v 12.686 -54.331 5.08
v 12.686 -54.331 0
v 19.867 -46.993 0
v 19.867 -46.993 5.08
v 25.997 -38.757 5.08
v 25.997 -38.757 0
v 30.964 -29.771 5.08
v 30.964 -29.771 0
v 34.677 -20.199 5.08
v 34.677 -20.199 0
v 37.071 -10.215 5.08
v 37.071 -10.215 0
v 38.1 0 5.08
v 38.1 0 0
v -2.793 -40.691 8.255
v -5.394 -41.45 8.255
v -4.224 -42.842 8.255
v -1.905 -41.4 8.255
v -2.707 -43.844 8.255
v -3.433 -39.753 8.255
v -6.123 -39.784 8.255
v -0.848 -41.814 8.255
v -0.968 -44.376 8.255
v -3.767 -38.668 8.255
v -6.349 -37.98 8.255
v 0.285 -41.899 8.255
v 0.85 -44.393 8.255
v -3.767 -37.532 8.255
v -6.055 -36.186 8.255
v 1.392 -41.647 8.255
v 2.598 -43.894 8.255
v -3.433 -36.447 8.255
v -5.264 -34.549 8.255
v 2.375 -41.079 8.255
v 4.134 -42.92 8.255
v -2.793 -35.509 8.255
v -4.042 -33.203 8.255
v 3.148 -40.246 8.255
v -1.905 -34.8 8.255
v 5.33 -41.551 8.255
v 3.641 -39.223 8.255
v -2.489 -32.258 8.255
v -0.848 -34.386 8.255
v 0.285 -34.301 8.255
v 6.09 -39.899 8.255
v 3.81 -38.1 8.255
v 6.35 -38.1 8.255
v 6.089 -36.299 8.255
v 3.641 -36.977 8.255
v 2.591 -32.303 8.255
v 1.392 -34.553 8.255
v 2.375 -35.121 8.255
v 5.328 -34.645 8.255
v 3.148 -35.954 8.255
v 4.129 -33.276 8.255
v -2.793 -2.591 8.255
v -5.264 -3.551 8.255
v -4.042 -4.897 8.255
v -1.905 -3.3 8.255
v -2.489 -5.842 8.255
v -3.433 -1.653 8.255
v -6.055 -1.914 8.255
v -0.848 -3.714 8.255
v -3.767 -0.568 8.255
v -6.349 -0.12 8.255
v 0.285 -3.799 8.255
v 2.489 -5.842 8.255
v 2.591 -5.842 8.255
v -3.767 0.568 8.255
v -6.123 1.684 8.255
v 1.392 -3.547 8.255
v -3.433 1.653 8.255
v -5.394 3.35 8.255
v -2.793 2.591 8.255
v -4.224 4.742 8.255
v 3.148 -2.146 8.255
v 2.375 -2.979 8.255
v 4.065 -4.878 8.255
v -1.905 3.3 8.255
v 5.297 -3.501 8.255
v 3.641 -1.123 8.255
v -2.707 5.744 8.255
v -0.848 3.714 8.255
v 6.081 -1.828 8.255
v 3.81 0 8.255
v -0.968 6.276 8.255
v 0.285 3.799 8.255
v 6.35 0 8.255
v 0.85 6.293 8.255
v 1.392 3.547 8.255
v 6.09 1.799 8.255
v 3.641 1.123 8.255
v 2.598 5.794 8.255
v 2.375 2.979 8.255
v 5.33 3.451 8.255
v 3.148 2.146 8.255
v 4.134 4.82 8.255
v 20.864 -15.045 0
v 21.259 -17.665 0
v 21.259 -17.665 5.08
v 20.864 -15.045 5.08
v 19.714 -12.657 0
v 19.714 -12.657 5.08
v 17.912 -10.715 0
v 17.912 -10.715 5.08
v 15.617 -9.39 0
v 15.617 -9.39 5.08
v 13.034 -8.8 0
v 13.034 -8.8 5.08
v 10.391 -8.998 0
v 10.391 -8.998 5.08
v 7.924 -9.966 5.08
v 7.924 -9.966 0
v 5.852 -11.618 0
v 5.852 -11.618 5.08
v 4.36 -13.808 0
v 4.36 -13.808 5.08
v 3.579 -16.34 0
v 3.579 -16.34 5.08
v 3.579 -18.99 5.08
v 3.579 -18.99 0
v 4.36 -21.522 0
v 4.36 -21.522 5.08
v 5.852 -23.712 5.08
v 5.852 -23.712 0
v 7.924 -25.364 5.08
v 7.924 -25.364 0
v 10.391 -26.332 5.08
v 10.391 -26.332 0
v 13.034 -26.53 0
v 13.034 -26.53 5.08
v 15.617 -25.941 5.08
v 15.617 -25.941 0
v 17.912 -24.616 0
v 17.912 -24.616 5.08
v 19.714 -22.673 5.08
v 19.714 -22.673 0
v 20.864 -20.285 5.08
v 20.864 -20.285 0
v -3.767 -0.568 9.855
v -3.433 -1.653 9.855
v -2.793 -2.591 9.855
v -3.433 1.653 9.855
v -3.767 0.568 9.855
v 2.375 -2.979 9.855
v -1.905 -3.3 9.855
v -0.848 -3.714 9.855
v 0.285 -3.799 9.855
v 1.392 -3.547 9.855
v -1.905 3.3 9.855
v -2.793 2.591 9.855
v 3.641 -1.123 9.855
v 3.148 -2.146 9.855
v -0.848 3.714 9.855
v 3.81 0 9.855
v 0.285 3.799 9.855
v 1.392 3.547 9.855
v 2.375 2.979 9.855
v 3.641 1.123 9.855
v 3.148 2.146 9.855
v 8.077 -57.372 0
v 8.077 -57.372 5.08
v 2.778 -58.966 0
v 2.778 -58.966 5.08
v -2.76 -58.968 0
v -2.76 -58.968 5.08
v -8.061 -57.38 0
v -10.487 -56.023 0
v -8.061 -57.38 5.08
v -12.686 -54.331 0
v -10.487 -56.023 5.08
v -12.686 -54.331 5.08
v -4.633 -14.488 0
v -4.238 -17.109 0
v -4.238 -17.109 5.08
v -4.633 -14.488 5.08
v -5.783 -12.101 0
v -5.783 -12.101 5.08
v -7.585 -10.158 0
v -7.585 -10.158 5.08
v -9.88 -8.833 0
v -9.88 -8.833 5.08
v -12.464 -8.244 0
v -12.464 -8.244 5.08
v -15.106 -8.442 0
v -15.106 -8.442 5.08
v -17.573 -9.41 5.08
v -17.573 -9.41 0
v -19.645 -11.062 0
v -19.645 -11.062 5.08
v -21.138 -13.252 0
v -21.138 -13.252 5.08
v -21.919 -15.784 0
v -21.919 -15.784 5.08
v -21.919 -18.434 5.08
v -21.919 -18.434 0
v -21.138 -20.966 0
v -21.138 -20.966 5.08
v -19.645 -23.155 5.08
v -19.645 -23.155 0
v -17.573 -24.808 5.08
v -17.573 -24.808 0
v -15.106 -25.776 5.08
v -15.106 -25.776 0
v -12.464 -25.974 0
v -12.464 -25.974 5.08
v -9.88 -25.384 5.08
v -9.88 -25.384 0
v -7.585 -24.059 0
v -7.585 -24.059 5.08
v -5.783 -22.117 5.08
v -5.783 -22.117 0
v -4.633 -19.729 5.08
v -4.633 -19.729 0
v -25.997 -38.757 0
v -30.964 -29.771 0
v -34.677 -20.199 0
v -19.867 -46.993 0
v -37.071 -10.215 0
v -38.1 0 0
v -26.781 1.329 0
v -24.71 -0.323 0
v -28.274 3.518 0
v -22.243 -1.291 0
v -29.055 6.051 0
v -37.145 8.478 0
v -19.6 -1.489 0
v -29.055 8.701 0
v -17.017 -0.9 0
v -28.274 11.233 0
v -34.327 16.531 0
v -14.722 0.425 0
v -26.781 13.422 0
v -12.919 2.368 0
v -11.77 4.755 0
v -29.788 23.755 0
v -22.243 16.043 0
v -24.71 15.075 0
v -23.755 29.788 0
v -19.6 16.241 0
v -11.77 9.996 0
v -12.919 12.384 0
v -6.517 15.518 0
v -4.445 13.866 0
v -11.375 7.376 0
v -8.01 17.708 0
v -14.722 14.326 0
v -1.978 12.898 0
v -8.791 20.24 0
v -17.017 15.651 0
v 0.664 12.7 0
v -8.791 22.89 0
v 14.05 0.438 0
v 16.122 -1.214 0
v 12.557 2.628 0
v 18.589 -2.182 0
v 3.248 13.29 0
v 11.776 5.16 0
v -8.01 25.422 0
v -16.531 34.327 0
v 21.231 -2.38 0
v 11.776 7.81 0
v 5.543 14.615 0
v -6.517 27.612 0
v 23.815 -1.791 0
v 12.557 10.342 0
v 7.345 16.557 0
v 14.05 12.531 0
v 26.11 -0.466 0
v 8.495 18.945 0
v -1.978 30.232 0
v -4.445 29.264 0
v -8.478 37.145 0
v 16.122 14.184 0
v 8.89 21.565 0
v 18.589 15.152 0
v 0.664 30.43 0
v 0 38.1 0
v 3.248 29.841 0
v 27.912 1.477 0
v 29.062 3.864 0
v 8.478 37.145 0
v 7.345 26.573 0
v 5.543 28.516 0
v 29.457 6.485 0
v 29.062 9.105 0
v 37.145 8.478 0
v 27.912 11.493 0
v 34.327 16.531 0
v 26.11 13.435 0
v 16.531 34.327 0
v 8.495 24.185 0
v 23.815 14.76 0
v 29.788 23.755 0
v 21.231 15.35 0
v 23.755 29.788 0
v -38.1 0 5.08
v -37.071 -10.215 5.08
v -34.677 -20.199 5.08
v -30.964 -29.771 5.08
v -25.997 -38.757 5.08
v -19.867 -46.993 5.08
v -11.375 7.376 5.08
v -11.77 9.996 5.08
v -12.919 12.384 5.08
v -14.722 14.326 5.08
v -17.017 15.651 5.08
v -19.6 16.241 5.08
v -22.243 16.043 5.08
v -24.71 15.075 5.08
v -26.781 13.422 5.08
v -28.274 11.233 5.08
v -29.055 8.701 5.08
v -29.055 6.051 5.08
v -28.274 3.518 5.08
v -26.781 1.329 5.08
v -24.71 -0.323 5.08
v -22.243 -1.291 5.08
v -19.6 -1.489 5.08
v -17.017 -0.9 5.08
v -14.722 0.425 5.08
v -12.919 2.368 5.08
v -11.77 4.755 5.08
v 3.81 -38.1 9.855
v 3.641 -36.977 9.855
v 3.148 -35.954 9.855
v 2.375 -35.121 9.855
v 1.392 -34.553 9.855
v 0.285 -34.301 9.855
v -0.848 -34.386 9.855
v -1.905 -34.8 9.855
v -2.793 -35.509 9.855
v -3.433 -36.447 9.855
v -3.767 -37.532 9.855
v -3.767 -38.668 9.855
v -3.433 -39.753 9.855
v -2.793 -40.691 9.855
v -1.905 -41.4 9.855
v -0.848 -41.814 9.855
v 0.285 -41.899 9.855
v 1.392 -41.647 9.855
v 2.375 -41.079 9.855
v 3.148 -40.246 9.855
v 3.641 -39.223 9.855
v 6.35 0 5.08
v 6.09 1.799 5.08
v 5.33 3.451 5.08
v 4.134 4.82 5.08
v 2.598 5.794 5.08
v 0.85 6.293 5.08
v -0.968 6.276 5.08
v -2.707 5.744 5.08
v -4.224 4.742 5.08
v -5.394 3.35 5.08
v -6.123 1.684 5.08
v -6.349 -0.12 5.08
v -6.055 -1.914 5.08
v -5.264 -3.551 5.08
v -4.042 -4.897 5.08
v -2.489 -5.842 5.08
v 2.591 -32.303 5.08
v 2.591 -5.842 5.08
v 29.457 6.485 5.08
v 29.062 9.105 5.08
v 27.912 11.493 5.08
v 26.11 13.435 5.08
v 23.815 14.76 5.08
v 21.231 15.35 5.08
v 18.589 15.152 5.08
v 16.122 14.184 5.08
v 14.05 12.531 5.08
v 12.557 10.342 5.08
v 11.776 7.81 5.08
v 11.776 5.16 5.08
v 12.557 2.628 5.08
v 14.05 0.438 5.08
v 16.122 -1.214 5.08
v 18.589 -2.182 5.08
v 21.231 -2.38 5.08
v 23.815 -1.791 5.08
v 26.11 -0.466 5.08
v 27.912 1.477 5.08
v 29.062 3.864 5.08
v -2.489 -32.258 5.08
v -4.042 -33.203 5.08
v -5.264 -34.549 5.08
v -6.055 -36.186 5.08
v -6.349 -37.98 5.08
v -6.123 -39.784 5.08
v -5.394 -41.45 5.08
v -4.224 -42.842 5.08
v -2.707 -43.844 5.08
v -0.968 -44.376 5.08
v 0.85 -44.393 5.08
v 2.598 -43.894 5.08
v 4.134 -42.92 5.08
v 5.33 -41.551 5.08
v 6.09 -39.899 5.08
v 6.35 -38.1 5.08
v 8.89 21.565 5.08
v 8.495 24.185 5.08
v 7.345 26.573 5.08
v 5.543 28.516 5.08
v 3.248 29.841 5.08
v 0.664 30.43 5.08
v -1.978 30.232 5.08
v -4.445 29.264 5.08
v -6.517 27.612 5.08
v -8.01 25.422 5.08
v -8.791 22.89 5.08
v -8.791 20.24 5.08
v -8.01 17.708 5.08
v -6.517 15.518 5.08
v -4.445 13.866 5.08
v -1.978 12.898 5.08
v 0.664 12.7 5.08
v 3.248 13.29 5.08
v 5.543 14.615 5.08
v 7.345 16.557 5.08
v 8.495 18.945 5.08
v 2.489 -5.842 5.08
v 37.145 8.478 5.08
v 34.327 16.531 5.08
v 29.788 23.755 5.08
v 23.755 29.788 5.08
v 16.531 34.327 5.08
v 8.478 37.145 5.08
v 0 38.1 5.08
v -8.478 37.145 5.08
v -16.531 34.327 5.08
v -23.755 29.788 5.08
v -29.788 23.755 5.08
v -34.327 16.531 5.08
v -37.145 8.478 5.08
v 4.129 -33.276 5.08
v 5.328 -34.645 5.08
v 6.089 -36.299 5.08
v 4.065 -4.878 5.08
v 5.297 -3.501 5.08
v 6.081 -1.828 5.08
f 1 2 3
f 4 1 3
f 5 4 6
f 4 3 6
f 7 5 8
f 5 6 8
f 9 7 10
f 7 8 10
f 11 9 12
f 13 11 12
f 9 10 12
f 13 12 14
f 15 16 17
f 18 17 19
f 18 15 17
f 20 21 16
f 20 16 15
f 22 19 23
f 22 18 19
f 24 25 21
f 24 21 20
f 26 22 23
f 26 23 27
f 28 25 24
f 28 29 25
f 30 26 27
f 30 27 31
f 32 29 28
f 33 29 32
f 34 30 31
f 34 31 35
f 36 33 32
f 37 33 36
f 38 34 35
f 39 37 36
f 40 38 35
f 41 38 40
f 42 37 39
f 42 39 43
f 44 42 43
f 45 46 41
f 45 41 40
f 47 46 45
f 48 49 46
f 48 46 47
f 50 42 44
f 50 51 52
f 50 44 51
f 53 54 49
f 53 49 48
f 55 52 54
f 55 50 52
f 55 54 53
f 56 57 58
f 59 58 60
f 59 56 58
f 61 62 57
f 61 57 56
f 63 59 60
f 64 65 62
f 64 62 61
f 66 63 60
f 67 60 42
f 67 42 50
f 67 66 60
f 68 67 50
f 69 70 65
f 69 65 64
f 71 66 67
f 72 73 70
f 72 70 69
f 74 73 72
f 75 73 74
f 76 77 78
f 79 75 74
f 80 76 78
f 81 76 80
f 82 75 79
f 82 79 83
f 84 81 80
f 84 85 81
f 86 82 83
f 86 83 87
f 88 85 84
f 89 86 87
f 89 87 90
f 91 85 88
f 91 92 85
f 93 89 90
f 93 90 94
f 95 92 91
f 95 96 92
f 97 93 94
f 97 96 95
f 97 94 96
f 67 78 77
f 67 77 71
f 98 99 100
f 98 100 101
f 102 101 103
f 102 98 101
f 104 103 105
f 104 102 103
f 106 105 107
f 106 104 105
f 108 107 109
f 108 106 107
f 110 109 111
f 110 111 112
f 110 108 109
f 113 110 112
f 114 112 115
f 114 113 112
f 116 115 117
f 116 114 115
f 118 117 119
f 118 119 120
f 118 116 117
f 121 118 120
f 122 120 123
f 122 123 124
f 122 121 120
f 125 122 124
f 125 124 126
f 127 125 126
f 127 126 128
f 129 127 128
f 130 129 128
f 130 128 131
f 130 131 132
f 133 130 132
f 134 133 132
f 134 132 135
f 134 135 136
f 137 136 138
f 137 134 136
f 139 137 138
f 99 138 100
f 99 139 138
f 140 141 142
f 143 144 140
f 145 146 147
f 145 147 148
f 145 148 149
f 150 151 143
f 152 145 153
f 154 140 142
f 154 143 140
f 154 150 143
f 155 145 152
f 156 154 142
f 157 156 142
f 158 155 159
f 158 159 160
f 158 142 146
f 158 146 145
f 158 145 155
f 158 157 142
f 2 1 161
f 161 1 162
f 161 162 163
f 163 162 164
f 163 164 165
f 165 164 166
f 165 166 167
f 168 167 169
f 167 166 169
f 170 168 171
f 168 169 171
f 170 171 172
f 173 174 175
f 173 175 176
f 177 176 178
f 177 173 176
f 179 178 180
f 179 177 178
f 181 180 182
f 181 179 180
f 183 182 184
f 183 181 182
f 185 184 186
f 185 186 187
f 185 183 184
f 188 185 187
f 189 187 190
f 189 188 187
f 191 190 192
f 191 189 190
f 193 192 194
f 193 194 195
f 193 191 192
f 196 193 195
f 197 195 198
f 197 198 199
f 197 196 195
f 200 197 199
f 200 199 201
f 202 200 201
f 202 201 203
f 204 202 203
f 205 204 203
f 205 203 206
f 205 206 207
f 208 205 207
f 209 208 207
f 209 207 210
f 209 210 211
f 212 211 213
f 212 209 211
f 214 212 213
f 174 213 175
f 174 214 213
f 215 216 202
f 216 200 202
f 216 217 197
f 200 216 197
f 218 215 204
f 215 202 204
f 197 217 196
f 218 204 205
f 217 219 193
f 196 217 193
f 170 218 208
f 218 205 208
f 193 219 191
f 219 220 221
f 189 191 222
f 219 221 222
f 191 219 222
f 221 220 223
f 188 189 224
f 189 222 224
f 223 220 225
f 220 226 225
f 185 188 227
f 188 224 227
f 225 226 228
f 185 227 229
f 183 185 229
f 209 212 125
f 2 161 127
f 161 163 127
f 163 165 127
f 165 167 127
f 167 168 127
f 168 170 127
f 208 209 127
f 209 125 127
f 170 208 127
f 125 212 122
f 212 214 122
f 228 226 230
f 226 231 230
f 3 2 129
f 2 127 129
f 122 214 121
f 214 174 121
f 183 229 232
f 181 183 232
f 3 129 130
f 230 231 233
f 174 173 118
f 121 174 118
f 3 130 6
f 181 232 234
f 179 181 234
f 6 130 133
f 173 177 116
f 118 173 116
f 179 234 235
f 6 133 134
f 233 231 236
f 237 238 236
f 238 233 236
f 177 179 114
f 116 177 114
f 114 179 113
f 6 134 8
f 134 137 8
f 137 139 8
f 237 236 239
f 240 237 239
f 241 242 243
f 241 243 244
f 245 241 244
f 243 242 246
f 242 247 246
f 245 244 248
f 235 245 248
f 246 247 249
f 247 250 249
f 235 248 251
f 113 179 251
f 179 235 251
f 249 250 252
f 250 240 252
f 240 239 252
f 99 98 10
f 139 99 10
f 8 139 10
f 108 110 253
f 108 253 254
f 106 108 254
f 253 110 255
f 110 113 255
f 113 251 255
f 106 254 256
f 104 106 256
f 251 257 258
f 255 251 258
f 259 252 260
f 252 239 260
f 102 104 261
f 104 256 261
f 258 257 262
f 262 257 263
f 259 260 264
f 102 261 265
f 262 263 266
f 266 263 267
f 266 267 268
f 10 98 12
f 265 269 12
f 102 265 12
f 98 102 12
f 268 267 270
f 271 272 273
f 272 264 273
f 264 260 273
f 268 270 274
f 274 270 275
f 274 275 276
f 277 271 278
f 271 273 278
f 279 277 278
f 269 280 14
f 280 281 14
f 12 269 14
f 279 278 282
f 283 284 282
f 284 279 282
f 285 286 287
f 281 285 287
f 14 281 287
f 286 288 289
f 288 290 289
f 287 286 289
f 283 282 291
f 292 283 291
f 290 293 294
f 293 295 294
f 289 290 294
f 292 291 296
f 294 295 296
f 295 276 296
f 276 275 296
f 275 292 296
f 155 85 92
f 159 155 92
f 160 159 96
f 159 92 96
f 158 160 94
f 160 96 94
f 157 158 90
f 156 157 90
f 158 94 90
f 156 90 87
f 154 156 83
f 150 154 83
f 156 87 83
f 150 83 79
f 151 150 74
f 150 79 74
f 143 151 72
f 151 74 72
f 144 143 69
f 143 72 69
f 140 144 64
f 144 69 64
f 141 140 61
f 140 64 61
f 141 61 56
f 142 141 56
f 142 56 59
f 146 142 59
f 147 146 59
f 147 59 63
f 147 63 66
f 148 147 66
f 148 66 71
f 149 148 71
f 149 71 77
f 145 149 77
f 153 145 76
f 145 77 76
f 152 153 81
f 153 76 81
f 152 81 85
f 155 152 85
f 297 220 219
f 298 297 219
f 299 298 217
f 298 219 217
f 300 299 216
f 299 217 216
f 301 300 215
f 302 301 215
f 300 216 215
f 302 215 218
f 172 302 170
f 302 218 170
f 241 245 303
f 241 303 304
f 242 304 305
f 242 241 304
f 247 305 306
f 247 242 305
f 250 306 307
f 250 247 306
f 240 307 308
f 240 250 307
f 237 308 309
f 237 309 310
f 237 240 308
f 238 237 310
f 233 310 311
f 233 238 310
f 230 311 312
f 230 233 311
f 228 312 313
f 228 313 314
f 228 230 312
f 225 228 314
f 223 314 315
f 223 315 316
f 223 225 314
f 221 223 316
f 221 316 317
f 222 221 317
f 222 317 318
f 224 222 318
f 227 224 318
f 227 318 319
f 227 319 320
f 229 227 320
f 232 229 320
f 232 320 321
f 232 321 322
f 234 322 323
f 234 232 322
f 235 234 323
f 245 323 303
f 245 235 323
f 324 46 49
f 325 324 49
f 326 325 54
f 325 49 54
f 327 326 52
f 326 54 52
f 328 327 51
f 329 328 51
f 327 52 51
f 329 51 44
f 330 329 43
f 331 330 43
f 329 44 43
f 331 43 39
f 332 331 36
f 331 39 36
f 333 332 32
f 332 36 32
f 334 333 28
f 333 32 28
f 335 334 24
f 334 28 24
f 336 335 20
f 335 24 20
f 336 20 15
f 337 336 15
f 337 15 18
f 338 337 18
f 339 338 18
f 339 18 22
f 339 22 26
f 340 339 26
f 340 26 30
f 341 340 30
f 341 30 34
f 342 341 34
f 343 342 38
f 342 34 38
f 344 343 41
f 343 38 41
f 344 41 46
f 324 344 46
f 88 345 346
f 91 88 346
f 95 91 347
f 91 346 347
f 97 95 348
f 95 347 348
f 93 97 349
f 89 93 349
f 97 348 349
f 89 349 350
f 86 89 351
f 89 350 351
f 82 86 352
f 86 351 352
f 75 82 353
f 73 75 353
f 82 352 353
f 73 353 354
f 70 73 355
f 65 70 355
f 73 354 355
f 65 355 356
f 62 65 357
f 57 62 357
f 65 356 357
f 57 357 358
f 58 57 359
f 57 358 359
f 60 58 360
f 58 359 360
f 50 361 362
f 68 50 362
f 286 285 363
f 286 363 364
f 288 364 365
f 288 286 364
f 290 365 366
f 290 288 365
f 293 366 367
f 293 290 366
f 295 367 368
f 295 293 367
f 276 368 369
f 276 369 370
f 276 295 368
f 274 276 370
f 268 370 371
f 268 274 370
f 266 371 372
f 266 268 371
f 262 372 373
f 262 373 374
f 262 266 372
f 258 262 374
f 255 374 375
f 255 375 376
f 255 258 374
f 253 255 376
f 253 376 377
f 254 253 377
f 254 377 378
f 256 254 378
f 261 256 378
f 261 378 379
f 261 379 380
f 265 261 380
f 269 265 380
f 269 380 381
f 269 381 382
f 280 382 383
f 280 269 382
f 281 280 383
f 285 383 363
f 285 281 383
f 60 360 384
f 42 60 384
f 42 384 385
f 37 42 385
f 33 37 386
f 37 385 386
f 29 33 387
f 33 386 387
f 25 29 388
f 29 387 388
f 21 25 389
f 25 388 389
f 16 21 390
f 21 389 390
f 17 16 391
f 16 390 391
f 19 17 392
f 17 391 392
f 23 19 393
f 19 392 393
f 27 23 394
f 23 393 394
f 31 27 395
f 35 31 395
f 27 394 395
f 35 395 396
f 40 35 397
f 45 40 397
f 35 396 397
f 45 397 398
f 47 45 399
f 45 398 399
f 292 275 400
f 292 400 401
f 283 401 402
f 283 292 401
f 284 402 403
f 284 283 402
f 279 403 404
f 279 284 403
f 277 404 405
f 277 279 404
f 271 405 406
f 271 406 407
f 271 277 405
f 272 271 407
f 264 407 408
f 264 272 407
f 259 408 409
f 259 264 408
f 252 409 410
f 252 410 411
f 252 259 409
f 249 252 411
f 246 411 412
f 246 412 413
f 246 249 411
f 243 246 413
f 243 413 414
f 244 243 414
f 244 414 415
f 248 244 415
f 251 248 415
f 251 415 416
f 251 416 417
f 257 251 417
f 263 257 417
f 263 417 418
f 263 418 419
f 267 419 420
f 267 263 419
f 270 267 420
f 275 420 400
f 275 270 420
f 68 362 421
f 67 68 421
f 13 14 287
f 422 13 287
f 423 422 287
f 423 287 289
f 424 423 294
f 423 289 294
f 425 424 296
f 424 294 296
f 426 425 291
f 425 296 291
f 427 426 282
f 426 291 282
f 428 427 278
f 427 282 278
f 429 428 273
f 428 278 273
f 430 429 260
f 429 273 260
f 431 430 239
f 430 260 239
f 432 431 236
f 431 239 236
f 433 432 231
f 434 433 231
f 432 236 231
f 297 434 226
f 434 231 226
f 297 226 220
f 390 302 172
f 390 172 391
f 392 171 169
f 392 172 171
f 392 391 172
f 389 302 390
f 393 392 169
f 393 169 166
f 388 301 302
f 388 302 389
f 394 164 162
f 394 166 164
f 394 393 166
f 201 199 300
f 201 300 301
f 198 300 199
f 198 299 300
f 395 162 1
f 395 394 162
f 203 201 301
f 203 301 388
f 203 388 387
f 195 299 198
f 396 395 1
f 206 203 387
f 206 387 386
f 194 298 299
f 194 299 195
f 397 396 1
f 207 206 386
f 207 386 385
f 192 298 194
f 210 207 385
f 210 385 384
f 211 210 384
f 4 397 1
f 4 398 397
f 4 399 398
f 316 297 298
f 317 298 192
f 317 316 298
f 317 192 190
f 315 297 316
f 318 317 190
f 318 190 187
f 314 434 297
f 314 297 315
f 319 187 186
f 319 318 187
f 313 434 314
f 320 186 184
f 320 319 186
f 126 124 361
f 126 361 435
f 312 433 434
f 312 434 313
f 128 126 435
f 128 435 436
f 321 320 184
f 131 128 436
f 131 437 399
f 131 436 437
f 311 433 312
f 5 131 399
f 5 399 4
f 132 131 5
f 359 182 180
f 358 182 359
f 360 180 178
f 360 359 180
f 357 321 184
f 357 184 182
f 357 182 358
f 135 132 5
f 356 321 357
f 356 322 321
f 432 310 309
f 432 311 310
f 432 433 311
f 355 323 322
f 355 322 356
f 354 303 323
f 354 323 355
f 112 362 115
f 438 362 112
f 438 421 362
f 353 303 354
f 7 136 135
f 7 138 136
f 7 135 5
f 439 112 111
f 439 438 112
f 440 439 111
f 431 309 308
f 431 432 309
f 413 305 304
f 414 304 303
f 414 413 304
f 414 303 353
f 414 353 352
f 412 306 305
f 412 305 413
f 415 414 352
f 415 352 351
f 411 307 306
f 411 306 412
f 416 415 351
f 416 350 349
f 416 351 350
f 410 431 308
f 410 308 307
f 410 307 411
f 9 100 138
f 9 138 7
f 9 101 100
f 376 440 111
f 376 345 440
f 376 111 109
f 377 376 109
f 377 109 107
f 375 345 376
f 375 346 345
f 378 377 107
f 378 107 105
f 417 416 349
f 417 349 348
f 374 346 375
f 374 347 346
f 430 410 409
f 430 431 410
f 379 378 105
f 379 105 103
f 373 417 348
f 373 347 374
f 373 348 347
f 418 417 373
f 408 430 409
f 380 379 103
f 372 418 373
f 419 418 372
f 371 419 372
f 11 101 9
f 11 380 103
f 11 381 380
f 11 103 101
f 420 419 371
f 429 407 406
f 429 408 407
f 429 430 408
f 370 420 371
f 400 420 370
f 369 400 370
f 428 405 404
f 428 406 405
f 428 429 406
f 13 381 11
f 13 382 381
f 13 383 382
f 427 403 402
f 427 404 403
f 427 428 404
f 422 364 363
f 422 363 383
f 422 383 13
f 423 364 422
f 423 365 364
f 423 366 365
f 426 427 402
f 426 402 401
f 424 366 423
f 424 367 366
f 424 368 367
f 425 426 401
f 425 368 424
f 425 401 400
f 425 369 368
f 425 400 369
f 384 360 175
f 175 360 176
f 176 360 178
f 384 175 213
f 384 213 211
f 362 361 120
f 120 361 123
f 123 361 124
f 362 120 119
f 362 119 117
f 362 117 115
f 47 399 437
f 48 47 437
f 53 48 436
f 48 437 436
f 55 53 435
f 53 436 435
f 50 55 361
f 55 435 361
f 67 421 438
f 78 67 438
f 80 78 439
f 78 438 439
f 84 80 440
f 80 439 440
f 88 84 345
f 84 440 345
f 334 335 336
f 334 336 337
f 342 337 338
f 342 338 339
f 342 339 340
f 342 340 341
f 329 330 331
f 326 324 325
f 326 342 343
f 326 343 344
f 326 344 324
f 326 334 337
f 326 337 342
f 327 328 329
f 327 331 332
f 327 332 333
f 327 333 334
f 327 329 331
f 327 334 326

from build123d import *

# Parameters (mm, degrees)
F0_R     = 8.89
F1_DEPTH = 5.08
F3_R     = 19.05
F4_DEPTH = 3.175
F5_R     = 3.81
F6_DEPTH = 1.6002


with BuildPart() as f1:
    # F0 (on Top) → F1 (new body)
    with BuildSketch(Plane.XY):
        with BuildLine():
            ThreePointArc((0, -63.5), (27.2824792884, -36.689487573), (38.1, 0))
            ThreePointArc((38.1, 0), (0, 38.1), (-38.1, 0))
            ThreePointArc((-38.1, 0), (-27.2824792884, -36.689487573), (0, -63.5))
        make_face()
        with Locations((-13.1279943906, -17.1087353843)):
            Circle(F0_R, mode=Mode.SUBTRACT)
        with Locations((12.3692268928, -17.6650867319)):
            Circle(F0_R, mode=Mode.SUBTRACT)
        with Locations((-20.264554991, 7.3756948274)):
            Circle(F0_R, mode=Mode.SUBTRACT)
        with Locations((0, 21.5650889905)):
            Circle(F0_R, mode=Mode.SUBTRACT)
        with Locations((20.5669909147, 6.4847473263)):
            Circle(F0_R, mode=Mode.SUBTRACT)
    extrude(amount=F1_DEPTH)

    # F3
    f3_edges = [f1.edges().sort_by_distance(p)[0] for p in [
        (0, -63.5, 2.54),
    ]]
    fillet(f3_edges, radius=F3_R)

    # F2 (on face) → F4 (join)
    with BuildSketch(Plane.XY.offset(5.08)):
        with BuildLine():
            ThreePointArc((2.4886815787, -5.842), (5.2974346633, -3.5013834391), (6.35, 0))
            ThreePointArc((6.35, 0), (-3.5013834391, 5.2974346633), (-2.4886815787, -5.842))
            ThreePointArc((-2.4886815787, -5.842), (0, -6.35), (2.4886815787, -5.842))
        make_face()
        with BuildLine():
            ThreePointArc((2.4886815787, -5.842), (0, -6.35), (-2.4886815787, -5.842))
            Line((-2.4886815787, -5.842), (-2.4886815787, -32.258))
            ThreePointArc((-2.4886815787, -32.258), (-1.27, -31.8782960533), (0, -31.75))
            ThreePointArc((0, -31.75), (1.3248127312, -31.8897366218), (2.5913184213, -32.3027964639))
            Line((2.5913184213, -32.3027964639), (2.5913184213, -5.842))
            Line((2.5913184213, -5.842), (2.4886815787, -5.842))
        make_face()
        with BuildLine():
            ThreePointArc((0, -31.75), (-1.27, -31.8782960533), (-2.4886815787, -32.258))
            ThreePointArc((-2.4886815787, -32.258), (-3.5013834391, -43.3974346633), (6.35, -38.1))
            ThreePointArc((6.35, -38.1), (5.3281034138, -34.6454647183), (2.5913184213, -32.3027964639))
            Line((2.5913184213, -32.3027964639), (0, -31.75))
        make_face()
        with BuildLine():
            ThreePointArc((2.5913184213, -32.3027964639), (1.3248127312, -31.8897366218), (0, -31.75))
            Line((0, -31.75), (2.5913184213, -32.3027964639))
        make_face()
    extrude(amount=F4_DEPTH)

    # F5 (on face) → F6 (join)
    with BuildSketch(Plane.XY.offset(8.255)):
        with Locations((0, -38.1)):
            Circle(F5_R)
        Circle(F5_R)
    extrude(amount=F6_DEPTH)


solid = f1.part
